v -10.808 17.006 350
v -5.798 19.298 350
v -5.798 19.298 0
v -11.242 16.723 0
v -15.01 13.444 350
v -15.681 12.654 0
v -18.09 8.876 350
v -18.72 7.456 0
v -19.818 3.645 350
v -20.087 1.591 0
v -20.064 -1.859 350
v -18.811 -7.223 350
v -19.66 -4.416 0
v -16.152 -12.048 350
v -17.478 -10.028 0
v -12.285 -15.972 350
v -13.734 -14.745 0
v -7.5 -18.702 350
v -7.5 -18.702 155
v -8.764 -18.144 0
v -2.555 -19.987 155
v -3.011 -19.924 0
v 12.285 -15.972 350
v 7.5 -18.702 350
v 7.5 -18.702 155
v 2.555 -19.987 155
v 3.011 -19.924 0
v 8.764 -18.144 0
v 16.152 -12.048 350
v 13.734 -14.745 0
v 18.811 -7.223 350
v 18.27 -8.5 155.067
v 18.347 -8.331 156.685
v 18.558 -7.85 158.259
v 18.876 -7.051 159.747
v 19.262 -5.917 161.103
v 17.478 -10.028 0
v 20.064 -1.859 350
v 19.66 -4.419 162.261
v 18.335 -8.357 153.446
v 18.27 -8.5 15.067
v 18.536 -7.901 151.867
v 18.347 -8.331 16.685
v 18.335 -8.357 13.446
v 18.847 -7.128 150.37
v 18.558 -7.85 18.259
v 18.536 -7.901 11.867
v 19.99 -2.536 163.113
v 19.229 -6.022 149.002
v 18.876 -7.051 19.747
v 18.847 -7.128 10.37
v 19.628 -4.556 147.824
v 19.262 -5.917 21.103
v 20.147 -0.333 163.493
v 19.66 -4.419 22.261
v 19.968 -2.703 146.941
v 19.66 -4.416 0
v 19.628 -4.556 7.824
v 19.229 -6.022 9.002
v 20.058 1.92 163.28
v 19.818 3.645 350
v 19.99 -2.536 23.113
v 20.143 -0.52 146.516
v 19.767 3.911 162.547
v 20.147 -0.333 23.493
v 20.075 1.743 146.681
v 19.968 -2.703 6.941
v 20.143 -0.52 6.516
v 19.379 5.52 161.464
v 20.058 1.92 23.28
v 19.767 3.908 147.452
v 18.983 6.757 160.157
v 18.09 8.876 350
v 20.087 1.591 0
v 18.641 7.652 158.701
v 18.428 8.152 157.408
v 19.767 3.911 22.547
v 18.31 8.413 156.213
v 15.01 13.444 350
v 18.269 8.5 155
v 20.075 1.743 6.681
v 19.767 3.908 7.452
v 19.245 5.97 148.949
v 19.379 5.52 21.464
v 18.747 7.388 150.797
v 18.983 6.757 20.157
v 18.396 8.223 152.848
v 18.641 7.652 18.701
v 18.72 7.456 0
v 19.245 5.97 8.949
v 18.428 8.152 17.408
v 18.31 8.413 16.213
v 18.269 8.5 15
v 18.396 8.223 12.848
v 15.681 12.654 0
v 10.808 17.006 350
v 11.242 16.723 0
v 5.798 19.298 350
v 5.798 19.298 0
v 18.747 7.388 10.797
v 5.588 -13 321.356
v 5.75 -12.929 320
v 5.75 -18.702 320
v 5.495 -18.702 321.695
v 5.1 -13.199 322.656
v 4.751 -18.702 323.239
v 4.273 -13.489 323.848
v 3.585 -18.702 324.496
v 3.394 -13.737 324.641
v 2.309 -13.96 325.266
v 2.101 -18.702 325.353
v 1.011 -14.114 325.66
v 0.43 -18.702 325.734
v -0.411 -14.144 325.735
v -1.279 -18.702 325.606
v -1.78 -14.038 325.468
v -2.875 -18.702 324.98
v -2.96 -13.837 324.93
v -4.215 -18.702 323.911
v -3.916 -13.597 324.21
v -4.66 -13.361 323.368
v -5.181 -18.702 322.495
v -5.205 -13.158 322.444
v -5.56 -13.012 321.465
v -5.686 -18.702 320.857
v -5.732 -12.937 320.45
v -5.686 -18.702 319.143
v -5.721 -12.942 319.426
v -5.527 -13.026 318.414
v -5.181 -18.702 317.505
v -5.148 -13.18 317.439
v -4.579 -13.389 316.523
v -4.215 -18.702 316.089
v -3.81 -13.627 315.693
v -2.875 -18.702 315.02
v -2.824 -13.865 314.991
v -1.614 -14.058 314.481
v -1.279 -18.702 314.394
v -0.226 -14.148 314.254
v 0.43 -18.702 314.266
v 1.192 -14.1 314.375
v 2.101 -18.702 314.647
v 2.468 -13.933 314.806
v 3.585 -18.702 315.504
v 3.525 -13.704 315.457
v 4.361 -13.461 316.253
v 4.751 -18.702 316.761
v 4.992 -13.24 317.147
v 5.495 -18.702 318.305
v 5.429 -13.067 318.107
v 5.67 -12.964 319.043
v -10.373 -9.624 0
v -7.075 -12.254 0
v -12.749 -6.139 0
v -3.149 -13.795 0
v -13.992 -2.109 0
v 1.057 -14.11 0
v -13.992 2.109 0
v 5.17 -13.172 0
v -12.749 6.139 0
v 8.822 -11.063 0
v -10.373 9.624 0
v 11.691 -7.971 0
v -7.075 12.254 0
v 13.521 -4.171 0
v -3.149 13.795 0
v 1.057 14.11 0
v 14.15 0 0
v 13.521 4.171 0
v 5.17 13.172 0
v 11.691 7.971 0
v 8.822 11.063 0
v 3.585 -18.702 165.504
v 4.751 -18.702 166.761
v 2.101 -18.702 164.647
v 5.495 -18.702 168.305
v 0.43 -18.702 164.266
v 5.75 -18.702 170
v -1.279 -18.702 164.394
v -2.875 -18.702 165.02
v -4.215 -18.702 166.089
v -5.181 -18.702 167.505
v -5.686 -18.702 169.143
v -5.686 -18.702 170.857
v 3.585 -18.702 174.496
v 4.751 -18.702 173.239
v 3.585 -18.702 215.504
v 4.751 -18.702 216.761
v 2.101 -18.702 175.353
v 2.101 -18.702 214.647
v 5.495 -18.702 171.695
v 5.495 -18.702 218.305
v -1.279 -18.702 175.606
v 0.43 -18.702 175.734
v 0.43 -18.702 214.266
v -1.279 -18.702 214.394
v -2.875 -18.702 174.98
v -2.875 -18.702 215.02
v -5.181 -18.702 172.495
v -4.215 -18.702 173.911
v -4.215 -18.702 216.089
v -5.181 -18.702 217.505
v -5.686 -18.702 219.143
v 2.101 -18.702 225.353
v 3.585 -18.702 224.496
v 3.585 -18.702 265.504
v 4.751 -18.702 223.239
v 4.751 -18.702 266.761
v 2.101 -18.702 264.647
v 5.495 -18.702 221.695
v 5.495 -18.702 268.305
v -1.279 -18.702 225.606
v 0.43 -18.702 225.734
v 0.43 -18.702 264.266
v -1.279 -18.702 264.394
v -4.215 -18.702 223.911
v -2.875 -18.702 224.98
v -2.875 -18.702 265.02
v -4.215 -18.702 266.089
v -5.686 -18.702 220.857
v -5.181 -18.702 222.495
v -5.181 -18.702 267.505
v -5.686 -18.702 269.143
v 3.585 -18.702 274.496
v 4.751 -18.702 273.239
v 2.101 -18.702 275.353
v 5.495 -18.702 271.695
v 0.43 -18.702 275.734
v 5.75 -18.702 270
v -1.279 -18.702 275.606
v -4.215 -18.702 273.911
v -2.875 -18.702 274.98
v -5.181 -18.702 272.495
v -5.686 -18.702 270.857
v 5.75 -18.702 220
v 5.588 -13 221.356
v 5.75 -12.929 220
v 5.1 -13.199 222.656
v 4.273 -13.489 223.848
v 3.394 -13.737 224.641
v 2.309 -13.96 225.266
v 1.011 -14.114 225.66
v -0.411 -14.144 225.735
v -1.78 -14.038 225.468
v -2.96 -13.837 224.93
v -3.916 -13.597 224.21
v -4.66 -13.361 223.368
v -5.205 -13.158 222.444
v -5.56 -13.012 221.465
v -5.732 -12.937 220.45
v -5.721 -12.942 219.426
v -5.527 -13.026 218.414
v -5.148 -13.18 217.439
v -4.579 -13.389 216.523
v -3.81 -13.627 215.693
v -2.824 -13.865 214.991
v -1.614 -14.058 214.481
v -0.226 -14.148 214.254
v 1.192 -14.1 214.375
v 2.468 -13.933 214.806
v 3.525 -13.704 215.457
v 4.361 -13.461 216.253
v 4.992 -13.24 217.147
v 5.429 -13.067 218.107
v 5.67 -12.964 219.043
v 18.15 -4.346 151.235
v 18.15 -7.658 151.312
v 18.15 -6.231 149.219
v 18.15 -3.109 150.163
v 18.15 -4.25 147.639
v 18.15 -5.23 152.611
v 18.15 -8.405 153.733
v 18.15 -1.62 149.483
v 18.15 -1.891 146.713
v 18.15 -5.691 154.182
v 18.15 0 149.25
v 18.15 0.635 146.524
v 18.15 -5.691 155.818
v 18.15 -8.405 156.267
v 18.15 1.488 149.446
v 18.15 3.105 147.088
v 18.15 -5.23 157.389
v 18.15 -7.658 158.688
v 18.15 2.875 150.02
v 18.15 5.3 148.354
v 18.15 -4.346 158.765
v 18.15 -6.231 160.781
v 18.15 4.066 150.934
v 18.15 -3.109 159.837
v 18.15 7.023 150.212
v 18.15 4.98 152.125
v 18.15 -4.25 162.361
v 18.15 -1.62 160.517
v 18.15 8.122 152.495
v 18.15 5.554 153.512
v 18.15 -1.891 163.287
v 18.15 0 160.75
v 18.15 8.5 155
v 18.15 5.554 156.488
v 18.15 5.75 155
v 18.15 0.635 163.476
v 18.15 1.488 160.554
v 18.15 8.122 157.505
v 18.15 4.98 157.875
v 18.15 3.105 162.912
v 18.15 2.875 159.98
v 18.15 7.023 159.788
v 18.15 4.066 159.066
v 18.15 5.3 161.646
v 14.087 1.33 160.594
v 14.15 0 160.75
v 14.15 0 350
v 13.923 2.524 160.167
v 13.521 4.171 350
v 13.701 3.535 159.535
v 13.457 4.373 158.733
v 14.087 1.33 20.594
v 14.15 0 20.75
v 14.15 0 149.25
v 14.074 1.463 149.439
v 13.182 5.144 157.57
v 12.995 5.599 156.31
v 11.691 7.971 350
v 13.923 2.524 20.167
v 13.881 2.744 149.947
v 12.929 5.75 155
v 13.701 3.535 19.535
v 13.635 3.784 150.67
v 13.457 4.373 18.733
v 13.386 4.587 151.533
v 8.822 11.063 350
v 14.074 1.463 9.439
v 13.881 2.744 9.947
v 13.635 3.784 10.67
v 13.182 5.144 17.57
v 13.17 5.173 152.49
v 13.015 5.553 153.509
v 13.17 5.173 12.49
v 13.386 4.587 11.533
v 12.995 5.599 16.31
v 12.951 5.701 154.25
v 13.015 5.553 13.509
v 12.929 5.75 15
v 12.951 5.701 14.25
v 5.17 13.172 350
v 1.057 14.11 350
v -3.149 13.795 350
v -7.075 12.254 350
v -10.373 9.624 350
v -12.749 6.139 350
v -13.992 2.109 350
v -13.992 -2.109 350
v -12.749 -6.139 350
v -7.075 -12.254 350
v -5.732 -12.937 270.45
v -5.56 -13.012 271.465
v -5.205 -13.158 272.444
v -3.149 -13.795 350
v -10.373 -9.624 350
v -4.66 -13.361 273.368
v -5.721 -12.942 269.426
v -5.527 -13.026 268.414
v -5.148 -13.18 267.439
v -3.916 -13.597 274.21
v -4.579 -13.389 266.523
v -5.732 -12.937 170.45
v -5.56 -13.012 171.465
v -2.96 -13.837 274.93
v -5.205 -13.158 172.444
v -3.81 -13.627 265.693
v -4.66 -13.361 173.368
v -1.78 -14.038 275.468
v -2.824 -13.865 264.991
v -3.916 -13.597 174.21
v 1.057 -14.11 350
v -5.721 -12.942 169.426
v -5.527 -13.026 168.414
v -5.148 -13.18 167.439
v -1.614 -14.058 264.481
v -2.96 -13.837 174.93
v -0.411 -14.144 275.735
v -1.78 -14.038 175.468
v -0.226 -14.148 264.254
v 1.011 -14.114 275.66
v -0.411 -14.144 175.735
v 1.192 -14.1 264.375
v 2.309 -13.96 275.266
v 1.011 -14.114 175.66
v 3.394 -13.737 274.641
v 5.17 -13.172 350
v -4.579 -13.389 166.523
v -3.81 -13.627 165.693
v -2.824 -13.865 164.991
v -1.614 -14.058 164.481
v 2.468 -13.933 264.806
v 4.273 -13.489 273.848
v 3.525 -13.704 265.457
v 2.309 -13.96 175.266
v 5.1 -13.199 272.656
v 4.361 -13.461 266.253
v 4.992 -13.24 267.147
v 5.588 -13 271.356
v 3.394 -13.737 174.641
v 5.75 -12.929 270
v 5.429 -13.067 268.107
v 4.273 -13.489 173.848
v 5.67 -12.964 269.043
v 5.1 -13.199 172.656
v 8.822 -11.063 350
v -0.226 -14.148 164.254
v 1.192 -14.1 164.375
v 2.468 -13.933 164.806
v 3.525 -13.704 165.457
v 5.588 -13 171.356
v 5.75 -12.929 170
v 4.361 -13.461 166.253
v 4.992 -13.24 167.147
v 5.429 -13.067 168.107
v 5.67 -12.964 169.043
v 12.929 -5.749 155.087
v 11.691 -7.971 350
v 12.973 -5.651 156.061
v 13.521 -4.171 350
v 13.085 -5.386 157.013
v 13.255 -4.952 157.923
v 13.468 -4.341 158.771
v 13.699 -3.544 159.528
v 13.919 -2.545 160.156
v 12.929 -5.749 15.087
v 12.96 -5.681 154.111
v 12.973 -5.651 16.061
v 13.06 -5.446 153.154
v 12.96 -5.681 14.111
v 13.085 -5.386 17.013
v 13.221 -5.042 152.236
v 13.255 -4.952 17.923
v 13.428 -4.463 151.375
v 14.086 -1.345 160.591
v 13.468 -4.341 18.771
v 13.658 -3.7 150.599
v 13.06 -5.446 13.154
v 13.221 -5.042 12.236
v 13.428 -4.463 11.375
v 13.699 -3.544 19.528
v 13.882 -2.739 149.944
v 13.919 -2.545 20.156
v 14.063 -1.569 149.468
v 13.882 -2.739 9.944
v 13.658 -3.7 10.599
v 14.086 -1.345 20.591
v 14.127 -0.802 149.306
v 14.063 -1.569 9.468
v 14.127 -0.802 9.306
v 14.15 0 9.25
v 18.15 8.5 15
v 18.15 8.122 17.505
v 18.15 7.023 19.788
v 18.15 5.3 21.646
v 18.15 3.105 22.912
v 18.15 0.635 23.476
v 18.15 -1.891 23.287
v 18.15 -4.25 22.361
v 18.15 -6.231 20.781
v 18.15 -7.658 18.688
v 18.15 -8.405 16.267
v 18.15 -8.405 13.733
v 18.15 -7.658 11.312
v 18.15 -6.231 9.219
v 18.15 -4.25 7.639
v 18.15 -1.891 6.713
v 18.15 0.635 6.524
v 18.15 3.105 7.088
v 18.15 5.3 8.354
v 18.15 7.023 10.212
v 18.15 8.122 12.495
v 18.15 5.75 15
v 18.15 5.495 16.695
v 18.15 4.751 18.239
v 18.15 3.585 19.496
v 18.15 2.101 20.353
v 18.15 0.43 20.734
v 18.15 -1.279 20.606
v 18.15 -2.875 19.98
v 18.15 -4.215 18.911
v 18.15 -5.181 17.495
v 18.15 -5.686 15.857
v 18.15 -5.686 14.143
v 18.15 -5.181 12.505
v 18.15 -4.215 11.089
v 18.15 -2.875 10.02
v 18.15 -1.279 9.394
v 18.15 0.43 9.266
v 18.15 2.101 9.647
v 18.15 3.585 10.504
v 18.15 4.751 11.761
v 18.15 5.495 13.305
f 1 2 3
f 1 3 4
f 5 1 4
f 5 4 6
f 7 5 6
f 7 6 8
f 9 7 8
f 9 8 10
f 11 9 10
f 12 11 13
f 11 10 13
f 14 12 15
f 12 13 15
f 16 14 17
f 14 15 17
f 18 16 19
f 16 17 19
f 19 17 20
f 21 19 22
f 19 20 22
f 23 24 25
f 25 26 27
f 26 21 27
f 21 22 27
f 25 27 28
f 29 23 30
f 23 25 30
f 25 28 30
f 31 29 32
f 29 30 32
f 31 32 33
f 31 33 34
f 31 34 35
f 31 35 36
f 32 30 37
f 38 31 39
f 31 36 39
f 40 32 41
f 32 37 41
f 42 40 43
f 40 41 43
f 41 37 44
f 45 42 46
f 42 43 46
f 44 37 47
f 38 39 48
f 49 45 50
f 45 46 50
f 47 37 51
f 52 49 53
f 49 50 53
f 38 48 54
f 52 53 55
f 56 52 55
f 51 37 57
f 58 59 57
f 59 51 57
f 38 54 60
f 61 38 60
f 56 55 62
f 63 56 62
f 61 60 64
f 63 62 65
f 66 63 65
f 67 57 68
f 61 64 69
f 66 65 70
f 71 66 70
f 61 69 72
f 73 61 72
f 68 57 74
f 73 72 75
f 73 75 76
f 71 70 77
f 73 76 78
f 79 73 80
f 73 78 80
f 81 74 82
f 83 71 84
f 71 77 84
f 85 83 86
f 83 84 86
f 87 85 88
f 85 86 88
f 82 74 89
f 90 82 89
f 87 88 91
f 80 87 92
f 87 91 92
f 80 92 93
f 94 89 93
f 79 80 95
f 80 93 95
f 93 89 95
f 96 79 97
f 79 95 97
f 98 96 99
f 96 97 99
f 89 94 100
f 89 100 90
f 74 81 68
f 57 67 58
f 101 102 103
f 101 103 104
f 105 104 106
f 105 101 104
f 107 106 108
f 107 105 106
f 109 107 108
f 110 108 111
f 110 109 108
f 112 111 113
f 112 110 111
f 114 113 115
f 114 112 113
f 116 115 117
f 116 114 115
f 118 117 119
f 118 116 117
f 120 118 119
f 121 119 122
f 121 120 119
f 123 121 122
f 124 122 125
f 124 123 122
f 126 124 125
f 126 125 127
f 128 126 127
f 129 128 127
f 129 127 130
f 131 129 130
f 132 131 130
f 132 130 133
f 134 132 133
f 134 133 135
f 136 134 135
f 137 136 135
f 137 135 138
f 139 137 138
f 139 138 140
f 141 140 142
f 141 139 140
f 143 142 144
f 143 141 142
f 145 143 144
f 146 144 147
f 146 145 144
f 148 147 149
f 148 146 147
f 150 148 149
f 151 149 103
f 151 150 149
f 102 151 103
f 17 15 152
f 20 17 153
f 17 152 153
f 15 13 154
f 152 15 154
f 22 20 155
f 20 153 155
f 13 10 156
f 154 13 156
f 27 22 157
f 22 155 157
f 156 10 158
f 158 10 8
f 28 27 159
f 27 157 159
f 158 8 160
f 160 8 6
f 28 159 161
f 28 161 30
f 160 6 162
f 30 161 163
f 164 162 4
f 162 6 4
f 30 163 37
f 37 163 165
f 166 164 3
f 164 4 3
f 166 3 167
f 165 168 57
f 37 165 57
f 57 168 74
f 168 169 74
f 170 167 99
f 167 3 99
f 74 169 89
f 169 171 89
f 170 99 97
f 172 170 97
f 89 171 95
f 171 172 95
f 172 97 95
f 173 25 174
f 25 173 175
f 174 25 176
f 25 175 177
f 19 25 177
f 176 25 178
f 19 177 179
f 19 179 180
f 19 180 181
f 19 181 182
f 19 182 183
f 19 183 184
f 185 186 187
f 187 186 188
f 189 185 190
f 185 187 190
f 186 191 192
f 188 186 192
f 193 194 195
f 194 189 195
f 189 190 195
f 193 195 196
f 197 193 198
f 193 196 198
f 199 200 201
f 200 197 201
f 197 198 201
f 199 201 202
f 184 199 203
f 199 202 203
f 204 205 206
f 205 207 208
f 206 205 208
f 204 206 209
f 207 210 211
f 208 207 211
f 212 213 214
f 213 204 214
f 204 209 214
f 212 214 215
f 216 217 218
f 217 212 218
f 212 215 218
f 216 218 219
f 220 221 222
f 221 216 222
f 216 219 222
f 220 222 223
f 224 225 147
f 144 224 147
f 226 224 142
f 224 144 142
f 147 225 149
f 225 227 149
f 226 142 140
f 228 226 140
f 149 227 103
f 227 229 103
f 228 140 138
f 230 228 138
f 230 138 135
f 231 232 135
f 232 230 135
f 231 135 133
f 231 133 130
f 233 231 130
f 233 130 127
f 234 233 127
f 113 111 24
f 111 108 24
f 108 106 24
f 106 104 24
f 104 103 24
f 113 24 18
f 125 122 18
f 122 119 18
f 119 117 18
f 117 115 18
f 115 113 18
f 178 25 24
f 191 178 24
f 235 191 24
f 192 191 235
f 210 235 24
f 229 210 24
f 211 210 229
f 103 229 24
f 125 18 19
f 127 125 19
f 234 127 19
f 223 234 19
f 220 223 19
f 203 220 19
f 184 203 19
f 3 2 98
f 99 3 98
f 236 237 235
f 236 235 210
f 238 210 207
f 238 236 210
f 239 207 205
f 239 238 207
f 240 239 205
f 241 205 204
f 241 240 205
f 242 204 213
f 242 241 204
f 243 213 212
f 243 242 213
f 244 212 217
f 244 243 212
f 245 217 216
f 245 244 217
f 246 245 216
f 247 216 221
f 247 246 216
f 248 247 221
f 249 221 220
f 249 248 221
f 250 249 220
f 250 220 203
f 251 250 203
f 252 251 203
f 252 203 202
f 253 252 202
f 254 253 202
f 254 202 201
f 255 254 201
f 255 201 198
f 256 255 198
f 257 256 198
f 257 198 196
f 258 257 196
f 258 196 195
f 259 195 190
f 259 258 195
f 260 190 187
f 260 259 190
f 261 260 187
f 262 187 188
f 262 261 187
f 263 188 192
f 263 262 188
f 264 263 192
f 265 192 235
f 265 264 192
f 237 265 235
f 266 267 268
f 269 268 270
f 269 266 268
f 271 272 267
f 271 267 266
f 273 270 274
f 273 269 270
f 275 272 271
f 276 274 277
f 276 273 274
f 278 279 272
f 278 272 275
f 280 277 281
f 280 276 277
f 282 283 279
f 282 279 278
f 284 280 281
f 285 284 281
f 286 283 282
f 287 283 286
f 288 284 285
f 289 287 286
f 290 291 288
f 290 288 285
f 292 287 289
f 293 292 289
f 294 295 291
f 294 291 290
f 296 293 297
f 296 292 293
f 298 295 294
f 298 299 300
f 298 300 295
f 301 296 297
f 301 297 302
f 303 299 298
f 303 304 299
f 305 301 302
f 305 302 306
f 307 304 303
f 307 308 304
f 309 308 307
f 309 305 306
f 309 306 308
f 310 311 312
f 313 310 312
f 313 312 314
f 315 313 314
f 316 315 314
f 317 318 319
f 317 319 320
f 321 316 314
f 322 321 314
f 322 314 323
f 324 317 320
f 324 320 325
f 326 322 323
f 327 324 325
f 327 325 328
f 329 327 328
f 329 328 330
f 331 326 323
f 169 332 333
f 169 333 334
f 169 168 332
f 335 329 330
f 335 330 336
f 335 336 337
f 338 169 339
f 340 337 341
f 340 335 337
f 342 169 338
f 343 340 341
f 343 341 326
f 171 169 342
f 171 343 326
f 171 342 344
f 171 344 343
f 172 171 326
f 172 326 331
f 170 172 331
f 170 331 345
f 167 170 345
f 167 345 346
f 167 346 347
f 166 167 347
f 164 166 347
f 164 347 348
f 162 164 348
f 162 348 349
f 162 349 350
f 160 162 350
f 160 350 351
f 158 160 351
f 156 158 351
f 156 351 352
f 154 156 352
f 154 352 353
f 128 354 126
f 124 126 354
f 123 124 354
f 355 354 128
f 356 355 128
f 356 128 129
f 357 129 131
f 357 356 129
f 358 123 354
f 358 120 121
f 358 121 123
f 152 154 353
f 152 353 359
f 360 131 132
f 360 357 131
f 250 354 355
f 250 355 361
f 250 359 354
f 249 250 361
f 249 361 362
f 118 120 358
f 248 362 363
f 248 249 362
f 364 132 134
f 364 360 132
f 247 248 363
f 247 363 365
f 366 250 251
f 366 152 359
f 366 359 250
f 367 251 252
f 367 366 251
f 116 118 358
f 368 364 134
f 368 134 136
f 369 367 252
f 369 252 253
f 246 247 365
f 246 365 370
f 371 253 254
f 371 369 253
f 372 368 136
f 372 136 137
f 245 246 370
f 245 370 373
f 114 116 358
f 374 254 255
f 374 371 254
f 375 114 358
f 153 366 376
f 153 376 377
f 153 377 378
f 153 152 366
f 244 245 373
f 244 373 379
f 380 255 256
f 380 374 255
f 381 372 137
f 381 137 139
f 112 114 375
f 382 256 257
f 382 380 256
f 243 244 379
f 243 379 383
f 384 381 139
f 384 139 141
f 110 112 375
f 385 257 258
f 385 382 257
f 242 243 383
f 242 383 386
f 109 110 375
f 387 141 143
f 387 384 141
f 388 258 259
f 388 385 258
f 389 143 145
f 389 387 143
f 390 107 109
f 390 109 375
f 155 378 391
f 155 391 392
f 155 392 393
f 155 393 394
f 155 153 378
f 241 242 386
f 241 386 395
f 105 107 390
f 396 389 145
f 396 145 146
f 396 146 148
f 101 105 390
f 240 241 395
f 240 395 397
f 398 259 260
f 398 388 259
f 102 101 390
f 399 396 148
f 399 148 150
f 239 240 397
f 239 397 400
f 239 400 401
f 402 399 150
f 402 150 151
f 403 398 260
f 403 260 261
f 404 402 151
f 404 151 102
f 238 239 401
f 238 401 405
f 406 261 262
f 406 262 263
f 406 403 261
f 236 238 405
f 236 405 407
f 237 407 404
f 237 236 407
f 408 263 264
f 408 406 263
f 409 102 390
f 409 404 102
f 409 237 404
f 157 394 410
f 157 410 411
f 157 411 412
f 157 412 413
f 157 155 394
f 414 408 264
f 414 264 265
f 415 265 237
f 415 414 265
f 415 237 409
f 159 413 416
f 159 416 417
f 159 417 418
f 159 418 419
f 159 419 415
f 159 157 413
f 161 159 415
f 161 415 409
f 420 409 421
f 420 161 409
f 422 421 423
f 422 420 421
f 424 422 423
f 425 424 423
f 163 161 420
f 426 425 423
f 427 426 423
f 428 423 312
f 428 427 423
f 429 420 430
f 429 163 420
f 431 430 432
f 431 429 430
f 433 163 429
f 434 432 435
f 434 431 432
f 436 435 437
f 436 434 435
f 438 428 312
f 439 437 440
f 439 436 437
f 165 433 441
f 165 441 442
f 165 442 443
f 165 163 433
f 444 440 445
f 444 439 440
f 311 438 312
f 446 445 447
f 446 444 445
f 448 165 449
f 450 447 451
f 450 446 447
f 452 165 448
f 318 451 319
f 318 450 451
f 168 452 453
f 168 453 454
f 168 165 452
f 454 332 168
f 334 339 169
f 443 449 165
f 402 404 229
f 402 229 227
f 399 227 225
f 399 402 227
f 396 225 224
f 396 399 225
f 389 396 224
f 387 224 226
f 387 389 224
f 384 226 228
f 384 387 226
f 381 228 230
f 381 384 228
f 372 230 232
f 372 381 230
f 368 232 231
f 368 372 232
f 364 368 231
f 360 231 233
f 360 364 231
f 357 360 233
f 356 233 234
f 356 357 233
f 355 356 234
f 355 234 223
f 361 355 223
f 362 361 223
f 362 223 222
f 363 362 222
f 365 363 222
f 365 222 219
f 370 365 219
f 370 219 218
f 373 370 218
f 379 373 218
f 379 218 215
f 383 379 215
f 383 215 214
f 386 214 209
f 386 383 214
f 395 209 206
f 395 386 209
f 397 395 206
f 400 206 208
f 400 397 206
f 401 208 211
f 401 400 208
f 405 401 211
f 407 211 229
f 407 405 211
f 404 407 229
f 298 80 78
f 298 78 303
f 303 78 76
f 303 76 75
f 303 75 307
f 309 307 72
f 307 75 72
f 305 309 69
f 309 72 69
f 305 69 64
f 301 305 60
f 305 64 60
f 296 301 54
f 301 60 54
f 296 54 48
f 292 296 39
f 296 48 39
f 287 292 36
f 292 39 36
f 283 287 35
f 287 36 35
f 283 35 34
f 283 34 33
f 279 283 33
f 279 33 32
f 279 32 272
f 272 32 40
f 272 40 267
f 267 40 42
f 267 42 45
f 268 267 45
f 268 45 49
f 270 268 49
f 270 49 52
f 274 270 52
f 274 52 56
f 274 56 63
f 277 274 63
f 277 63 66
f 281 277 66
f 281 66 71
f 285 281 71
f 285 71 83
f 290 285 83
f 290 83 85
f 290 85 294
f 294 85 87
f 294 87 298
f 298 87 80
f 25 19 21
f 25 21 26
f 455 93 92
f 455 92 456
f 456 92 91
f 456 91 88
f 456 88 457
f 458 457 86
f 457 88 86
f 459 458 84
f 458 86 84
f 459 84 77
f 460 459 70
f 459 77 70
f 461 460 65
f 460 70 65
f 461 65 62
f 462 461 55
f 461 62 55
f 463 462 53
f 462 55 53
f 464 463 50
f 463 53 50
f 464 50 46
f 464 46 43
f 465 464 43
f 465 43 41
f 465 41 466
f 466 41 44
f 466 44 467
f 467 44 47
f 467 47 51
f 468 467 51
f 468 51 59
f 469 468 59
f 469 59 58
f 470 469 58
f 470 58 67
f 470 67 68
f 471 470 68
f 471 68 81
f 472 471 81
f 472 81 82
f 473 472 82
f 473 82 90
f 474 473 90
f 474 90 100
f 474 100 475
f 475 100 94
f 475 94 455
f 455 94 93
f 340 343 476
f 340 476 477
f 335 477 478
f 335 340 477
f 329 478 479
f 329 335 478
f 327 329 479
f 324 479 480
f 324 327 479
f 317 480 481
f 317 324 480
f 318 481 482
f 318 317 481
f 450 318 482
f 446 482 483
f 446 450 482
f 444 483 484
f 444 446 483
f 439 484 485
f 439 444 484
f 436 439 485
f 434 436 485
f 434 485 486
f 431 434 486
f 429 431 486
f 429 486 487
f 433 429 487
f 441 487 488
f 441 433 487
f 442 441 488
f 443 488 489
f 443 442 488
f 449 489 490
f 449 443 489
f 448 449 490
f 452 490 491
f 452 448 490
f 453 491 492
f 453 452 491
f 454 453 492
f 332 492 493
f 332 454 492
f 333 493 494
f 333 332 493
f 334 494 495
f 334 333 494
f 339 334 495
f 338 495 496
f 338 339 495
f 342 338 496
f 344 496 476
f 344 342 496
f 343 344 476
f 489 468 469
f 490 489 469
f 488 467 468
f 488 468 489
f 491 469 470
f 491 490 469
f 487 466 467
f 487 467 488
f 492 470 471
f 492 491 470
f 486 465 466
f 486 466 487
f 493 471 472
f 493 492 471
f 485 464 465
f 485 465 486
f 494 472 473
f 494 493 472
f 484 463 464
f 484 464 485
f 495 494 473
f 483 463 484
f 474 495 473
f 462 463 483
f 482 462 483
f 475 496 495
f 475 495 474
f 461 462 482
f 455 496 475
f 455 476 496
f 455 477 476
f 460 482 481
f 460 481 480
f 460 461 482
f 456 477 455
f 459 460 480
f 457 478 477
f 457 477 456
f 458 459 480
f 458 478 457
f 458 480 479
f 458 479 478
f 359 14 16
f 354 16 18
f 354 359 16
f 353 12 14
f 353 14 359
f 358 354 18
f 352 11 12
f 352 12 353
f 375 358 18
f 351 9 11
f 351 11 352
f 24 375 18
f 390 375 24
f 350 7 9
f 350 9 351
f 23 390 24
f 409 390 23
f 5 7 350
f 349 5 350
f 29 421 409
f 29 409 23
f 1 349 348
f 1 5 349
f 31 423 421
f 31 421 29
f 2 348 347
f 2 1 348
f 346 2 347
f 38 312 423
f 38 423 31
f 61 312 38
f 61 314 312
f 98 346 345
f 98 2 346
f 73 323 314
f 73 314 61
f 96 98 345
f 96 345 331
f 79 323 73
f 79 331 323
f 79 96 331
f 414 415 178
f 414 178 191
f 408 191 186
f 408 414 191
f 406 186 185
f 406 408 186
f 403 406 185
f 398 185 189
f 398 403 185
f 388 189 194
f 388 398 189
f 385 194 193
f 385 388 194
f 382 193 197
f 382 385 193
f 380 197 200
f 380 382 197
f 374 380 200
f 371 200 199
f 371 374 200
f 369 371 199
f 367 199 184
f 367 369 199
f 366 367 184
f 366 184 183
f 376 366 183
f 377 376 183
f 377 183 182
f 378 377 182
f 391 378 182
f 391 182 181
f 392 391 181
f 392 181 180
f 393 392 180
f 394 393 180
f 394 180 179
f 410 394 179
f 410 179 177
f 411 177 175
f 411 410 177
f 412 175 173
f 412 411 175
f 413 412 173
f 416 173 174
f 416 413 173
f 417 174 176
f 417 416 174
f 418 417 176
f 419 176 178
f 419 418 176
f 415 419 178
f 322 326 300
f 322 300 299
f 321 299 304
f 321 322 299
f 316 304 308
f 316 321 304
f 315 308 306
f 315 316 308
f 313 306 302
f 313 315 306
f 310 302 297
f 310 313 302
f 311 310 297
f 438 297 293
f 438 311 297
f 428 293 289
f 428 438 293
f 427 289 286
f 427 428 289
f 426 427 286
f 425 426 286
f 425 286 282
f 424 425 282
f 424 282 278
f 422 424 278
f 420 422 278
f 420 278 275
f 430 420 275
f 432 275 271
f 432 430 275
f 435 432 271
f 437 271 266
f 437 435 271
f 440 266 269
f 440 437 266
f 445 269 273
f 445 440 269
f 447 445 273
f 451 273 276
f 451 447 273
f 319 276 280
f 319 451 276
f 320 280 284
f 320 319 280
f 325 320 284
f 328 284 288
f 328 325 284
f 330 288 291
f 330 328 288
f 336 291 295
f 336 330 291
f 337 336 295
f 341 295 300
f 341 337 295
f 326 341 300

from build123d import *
from build123d import SkipClean  # not in build123d's __all__

# Parameters (mm, degrees)
F0_R      = 20.15
F0_R_2    = 14.15
F1_DEPTH  = 350
F2_R      = 5.75
F3_DEPTH  = 25
F5_DEPTH  = 195
F6_DEPTH  = 350.0010001
F7_R      = 5.75
F8_DEPTH  = 20.15
F9_R      = 8.5
F10_DEPTH = 2
F11_DEPTH = 25


with BuildPart() as f1:
    # F0 (on Top) → F1 (new body)
    with BuildSketch(Plane.XY):
        Circle(F0_R)
        Circle(F0_R_2, mode=Mode.SUBTRACT)
    extrude(amount=F1_DEPTH)

    # F2 (on Front) → F3 (cut)
    with BuildSketch(Plane.XZ):
        with Locations((0, 320)):
            Circle(F2_R)
        with Locations((0, 270)):
            Circle(F2_R)
        with Locations((0, 220)):
            Circle(F2_R)
        with Locations((0, 170)):
            Circle(F2_R)
    extrude(amount=F3_DEPTH, mode=Mode.SUBTRACT)

    # F4 (on face) → F5 (cut)
    with BuildSketch(Plane.XY.offset(350)):
        with BuildLine():
            Line((-7.5, -21.5977942477), (7.5, -21.5977942477))
            Line((7.5, -21.5977942477), (7.5, -18.7022057523))
            ThreePointArc((7.5, -18.7022057523), (0, -20.15), (-7.5, -18.7022057523))
            Line((-7.5, -18.7022057523), (-7.5, -21.5977942477))
        make_face()
        with BuildLine():
            ThreePointArc((-7.5, -18.7022057523), (0, -20.15), (7.5, -18.7022057523))
            Line((7.5, -18.7022057523), (-7.5, -18.7022057523))
        make_face()
    extrude(amount=-F5_DEPTH, mode=Mode.SUBTRACT)

    # F4 (on face) → F6 (cut, through all)
    with BuildSketch(Plane.XY.offset(350)):
        with BuildLine():
            ThreePointArc((5.7980718495, 19.2977942477), (0, 20.15), (-5.7980718495, 19.2977942477))
            Line((-5.7980718495, 19.2977942477), (5.7980718495, 19.2977942477))
        make_face()
    extrude(amount=-F6_DEPTH, mode=Mode.SUBTRACT)

    # F7 (on Right) → F8 (join)
    with BuildSketch(Plane.YZ):
        with Locations((0, 15)):
            Circle(F7_R)
        with Locations((0, 155)):
            Circle(F7_R)
    with SkipClean():  # cleaning this boolean's faces spoils the solid; the shape is the same uncleaned
        extrude(amount=F8_DEPTH)

    # F9 (on face) → F10 (cut)
    with BuildSketch(Plane.YZ.offset(20.15)):
        with Locations((0, 155)):
            Circle(F9_R)
        with BuildLine():
            ThreePointArc((5.75, 155), (4.0658639918, 150.9341360082), (0, 149.25))
            ThreePointArc((0, 149.25), (-5.75, 155), (0, 160.75))
            ThreePointArc((0, 160.75), (4.0658639918, 159.0658639918), (5.75, 155))
        make_face(mode=Mode.SUBTRACT)
        with BuildLine():
            ThreePointArc((0, 160.75), (-5.75, 155), (0, 149.25))
            Line((0, 149.25), (0, 160.75))
        make_face()
        with Locations((0, 15)):
            Circle(F9_R)
    with SkipClean():  # cleaning this boolean's faces spoils the solid; the shape is the same uncleaned
        extrude(amount=-F10_DEPTH, mode=Mode.SUBTRACT)

    # F7 (on Right) → F11 (cut)
    with BuildSketch(Plane.YZ):
        with Locations((0, 15)):
            Circle(F7_R)
        with Locations((0, 155)):
            Circle(F7_R)
    extrude(amount=F11_DEPTH, mode=Mode.SUBTRACT)


solid = f1.part
